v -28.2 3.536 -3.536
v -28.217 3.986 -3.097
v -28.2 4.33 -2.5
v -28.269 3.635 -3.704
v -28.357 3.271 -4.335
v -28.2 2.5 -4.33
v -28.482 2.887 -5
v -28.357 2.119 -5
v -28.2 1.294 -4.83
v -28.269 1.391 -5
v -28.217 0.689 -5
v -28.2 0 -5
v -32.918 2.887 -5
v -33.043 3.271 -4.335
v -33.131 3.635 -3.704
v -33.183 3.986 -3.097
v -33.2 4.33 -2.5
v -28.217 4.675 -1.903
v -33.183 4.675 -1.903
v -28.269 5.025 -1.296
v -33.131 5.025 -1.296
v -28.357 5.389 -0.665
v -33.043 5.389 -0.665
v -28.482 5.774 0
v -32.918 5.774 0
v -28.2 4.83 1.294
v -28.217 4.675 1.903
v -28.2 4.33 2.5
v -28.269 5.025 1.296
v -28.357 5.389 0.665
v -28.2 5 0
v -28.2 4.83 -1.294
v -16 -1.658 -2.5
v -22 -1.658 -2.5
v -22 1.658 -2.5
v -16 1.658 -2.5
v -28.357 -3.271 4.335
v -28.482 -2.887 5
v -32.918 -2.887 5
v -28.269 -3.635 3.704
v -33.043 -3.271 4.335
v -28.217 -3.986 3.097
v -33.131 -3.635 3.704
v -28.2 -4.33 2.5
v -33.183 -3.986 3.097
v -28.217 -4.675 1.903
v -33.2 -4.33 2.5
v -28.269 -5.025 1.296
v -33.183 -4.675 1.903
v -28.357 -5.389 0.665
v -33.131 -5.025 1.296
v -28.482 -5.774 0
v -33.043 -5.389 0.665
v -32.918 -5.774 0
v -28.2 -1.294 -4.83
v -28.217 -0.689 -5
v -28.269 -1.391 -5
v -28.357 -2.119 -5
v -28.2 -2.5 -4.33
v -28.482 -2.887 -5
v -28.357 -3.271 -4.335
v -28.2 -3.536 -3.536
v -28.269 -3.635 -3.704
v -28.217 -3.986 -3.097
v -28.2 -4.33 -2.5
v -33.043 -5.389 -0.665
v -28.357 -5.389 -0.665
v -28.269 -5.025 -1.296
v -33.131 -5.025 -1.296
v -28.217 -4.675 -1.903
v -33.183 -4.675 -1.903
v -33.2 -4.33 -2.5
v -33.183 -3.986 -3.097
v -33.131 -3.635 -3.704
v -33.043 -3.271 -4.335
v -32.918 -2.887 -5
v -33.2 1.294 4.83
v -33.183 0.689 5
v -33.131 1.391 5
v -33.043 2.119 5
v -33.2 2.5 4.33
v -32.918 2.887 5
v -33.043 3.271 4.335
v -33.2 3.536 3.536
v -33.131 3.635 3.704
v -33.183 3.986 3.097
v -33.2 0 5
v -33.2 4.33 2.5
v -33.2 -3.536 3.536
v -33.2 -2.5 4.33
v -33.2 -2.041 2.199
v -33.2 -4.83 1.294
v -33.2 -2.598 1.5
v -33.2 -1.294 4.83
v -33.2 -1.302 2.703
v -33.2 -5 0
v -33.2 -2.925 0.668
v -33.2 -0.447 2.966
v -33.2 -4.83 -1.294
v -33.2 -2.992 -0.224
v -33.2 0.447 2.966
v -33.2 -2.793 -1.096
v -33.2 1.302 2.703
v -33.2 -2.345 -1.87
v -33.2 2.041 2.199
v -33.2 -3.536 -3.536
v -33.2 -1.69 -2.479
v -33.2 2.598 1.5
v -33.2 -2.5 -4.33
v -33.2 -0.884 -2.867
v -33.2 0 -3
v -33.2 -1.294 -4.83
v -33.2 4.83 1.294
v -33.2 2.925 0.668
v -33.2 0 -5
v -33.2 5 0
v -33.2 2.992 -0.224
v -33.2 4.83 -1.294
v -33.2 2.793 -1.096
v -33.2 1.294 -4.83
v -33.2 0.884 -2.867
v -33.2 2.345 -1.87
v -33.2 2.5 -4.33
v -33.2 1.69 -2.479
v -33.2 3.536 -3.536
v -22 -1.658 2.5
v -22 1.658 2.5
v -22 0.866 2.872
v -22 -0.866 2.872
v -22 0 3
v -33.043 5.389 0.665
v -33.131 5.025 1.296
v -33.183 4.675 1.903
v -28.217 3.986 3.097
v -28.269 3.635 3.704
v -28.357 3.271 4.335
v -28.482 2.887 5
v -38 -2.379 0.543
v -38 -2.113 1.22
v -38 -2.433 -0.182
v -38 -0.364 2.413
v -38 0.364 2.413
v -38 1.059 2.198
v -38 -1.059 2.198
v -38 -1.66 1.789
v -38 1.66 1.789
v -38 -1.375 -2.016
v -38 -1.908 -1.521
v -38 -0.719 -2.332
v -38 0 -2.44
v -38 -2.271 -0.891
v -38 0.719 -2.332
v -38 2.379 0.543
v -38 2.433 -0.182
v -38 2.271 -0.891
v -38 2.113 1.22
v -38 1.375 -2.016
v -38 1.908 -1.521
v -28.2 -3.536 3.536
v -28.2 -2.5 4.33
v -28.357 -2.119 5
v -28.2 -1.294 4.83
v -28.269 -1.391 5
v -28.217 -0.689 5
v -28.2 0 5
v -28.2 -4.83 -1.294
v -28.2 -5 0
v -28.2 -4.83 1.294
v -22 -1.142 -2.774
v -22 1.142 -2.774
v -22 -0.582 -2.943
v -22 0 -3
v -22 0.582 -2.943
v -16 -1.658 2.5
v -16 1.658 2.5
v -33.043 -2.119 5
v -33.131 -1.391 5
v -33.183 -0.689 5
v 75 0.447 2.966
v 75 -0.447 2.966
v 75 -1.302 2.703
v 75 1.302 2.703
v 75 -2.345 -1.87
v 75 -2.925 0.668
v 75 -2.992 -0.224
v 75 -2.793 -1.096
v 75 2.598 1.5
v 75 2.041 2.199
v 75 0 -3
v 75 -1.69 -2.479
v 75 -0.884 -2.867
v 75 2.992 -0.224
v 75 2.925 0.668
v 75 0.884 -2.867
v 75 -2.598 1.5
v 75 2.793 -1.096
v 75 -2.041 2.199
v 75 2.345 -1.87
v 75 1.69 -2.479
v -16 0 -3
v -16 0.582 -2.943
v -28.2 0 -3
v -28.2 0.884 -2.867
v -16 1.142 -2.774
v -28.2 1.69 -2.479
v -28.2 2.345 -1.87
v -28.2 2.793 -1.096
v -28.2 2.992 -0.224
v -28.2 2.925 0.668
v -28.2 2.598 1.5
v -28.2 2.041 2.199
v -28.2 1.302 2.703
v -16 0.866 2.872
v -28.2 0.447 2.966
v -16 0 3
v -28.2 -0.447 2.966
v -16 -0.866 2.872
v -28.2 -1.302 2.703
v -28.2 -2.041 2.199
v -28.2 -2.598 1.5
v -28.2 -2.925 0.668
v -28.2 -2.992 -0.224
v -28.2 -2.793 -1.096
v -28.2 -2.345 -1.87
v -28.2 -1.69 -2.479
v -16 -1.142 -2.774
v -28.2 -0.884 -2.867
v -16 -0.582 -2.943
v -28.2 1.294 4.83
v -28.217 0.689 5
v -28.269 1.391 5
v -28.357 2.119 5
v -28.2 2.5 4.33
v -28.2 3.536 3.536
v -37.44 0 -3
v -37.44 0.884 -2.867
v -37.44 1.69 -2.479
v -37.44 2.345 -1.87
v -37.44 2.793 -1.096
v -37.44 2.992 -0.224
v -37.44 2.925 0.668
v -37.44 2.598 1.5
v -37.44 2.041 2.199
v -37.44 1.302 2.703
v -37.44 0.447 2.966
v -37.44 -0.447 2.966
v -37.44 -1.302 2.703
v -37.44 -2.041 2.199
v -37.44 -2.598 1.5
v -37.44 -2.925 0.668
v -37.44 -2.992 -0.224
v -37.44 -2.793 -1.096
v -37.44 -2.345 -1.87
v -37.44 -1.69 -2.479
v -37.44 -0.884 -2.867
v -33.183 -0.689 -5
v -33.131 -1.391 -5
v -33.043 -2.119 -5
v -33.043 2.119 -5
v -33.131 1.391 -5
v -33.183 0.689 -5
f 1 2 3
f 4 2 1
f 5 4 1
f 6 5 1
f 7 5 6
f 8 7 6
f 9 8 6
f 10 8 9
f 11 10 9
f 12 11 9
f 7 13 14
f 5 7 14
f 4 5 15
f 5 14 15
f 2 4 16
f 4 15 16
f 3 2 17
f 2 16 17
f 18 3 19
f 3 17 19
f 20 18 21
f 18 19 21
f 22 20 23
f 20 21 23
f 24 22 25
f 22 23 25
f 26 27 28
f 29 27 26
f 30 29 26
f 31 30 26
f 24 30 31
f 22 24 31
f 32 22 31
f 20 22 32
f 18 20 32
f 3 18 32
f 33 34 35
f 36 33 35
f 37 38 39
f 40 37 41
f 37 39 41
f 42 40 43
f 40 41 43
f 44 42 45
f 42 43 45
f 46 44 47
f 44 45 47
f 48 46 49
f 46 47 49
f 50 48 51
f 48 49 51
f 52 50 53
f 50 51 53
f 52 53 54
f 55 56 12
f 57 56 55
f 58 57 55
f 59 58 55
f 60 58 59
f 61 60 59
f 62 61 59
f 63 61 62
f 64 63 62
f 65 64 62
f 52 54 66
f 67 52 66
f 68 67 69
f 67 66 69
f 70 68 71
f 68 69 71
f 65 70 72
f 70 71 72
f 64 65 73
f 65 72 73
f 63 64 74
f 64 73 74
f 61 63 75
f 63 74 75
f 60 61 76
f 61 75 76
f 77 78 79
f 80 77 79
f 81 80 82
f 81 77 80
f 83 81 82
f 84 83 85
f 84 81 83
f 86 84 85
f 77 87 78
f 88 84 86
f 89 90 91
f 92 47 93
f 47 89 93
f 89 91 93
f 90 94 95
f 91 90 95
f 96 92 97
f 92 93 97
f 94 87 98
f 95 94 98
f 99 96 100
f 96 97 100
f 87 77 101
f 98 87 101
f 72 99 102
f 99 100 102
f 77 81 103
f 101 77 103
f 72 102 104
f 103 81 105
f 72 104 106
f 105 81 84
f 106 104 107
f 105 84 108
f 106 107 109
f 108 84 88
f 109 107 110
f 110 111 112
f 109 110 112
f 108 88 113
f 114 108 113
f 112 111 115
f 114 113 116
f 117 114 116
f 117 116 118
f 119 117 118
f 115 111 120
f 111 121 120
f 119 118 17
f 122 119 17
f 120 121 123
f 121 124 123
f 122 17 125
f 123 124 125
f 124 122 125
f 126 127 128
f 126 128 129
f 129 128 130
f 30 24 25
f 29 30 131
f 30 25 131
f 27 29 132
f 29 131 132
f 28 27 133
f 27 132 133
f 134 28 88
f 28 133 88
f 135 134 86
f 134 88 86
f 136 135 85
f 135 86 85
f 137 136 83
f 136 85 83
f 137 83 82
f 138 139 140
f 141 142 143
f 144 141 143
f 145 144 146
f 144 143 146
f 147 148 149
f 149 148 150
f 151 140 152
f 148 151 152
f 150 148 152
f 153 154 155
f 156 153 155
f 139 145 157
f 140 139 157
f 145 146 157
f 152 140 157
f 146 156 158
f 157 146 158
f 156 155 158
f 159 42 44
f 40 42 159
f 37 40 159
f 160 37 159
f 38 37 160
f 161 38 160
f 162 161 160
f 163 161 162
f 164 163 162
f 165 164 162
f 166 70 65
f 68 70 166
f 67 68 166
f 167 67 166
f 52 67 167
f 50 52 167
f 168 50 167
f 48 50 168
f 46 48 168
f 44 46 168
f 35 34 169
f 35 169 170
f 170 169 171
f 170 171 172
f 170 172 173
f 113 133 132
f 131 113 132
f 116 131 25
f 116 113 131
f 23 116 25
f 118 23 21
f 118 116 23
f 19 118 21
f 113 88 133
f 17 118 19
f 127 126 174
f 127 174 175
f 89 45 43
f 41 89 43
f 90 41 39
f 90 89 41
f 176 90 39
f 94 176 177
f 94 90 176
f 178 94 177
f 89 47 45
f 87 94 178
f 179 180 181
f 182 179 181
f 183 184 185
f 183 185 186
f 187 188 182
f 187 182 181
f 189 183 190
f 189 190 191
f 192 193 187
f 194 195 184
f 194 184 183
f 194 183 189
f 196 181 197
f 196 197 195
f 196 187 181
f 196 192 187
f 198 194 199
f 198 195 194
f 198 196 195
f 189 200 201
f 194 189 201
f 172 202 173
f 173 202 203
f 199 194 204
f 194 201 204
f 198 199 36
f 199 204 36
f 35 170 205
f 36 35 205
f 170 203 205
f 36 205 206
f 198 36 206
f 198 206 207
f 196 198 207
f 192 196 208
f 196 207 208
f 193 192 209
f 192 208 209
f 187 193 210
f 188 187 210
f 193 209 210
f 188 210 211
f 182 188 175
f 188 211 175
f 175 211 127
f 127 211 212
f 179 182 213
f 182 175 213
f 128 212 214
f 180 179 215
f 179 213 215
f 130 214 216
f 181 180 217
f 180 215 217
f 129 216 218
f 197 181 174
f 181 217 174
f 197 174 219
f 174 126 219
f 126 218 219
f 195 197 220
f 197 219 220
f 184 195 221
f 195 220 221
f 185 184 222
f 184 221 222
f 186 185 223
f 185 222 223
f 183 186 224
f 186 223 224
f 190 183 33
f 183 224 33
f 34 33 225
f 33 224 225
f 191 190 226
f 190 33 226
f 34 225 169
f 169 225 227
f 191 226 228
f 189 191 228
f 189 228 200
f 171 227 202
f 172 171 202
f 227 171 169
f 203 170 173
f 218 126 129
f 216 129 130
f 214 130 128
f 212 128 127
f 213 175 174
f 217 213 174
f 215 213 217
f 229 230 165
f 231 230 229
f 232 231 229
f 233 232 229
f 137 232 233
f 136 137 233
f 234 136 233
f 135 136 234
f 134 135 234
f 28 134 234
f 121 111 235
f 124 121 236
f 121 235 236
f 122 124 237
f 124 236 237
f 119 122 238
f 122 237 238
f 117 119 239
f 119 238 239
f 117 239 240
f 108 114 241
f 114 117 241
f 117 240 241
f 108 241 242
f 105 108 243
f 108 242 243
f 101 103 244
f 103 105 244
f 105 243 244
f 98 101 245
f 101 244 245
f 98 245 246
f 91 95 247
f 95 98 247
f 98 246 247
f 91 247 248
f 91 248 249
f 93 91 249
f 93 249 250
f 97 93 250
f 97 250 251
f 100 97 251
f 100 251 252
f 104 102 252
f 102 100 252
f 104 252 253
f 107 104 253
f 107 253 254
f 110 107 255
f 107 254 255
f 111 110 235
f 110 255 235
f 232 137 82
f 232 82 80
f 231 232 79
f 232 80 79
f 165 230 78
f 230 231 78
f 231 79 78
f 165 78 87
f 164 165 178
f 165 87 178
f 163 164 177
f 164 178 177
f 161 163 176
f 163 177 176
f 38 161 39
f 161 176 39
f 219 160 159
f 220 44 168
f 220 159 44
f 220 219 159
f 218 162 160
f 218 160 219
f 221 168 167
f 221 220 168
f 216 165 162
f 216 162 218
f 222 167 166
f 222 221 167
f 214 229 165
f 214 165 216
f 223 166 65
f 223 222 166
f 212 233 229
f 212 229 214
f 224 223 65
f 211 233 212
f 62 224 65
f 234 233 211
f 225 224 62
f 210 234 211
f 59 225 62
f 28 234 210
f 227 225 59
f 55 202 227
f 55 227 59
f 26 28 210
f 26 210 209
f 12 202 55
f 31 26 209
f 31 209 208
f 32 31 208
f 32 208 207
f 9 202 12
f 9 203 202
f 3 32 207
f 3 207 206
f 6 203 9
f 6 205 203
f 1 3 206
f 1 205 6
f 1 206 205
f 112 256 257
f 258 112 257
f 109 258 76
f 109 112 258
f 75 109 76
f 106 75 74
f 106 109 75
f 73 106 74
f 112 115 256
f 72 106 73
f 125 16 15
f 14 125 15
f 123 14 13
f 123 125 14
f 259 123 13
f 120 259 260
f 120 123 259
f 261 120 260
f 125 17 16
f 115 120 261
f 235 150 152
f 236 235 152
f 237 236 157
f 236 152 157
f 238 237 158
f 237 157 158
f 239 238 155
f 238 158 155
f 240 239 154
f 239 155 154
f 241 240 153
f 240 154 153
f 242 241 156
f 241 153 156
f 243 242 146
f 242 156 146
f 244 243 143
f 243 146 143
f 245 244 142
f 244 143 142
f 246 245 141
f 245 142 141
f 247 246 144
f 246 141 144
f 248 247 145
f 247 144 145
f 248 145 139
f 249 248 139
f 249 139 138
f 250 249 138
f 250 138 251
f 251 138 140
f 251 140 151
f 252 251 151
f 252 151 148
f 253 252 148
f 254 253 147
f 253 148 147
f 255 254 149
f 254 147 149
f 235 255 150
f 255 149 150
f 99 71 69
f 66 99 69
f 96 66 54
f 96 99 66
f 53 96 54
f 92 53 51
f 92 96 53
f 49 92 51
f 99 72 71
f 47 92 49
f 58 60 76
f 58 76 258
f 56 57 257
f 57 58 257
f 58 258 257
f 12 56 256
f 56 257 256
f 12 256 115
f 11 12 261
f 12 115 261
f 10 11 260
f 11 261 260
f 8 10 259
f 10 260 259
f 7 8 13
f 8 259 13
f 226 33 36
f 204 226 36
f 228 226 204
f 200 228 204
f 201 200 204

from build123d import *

# Parameters (mm, degrees)
EXTRUDE_START        = -38
SKETCH_3_R           = 3
EXTRUDE_1_DEPTH      = 16
EXTRUDE_START_2      = -33.2
EXTRUDE_2_DEPTH      = 5
SKETCH_5_R           = 3
EXTRUDE_3_DEPTH      = 97
CUT_EXTRUDE_START    = -22
SKETCH_6_OUTSIDE_W   = 34.806
SKETCH_6_OUTSIDE_H   = 36.354
SKETCH_6_OUTSIDE_W_2 = 5
SKETCH_6_OUTSIDE_H_2 = 11.547005384
CUT_EXTRUDE_1_DEPTH  = 6
CHAMFER_1_SIZE       = 0.56


with BuildPart() as part:
    # 草图3 → 凸台-拉伸1 (new body)
    with BuildSketch(Plane(origin=(0, 0, 0), x_dir=(0, 0, -1), z_dir=(1, 0, 0)).offset(EXTRUDE_START)):
        Circle(SKETCH_3_R)
    extrude(amount=EXTRUDE_1_DEPTH)

    # 草图4 → 凸台-拉伸2 (add)
    with BuildSketch(Plane(origin=(0, 0, 0), x_dir=(0, 0, -1), z_dir=(1, 0, 0)).offset(EXTRUDE_START_2)):
        Polygon((0, -5.773502692), (5, -2.886751346), (5, 2.886751346), (0, 5.773502692), (-5, 2.886751346), (-5, -2.886751346), align=None)
    extrude(amount=EXTRUDE_2_DEPTH)

    # 草图5 → 凸台-拉伸3 (add)
    with BuildSketch(Plane(origin=(-22, 0, 0), x_dir=(0, 0, -1), z_dir=(1, 0, 0))):
        Circle(SKETCH_5_R)
    extrude(amount=EXTRUDE_3_DEPTH)

    # 草图6 outside → 切除-拉伸1 (cut)
    with BuildSketch(Plane(origin=(0, 0, 0), x_dir=(0, 0, -1), z_dir=(1, 0, 0)).offset(CUT_EXTRUDE_START)):
        Rectangle(SKETCH_6_OUTSIDE_W, SKETCH_6_OUTSIDE_H)
        Rectangle(SKETCH_6_OUTSIDE_W_2, SKETCH_6_OUTSIDE_H_2, mode=Mode.SUBTRACT)
    extrude(amount=CUT_EXTRUDE_1_DEPTH, mode=Mode.SUBTRACT)

    # 草图7 → 切除-旋转1 (revolve, cut)
    with BuildSketch(Plane(origin=(0, 0, 0), x_dir=(1, 0, 0), z_dir=(0, 1, 0))):
        Polygon((-33.2, 5), (-33.2, 16.868693549), (-28.2, 16.868693549), (-28.2, 5), (-30.7, 11.868693549), align=None)
    revolve(axis=Axis((-16, 0, 0), (-1, 0, 0)), mode=Mode.SUBTRACT)

    # 倒角1
    chamfer_1_edges = [part.edges().sort_by_distance(p)[0] for p in [
        (-38, 0, 3),
    ]]
    chamfer(chamfer_1_edges, length=CHAMFER_1_SIZE)


solid = part.part
